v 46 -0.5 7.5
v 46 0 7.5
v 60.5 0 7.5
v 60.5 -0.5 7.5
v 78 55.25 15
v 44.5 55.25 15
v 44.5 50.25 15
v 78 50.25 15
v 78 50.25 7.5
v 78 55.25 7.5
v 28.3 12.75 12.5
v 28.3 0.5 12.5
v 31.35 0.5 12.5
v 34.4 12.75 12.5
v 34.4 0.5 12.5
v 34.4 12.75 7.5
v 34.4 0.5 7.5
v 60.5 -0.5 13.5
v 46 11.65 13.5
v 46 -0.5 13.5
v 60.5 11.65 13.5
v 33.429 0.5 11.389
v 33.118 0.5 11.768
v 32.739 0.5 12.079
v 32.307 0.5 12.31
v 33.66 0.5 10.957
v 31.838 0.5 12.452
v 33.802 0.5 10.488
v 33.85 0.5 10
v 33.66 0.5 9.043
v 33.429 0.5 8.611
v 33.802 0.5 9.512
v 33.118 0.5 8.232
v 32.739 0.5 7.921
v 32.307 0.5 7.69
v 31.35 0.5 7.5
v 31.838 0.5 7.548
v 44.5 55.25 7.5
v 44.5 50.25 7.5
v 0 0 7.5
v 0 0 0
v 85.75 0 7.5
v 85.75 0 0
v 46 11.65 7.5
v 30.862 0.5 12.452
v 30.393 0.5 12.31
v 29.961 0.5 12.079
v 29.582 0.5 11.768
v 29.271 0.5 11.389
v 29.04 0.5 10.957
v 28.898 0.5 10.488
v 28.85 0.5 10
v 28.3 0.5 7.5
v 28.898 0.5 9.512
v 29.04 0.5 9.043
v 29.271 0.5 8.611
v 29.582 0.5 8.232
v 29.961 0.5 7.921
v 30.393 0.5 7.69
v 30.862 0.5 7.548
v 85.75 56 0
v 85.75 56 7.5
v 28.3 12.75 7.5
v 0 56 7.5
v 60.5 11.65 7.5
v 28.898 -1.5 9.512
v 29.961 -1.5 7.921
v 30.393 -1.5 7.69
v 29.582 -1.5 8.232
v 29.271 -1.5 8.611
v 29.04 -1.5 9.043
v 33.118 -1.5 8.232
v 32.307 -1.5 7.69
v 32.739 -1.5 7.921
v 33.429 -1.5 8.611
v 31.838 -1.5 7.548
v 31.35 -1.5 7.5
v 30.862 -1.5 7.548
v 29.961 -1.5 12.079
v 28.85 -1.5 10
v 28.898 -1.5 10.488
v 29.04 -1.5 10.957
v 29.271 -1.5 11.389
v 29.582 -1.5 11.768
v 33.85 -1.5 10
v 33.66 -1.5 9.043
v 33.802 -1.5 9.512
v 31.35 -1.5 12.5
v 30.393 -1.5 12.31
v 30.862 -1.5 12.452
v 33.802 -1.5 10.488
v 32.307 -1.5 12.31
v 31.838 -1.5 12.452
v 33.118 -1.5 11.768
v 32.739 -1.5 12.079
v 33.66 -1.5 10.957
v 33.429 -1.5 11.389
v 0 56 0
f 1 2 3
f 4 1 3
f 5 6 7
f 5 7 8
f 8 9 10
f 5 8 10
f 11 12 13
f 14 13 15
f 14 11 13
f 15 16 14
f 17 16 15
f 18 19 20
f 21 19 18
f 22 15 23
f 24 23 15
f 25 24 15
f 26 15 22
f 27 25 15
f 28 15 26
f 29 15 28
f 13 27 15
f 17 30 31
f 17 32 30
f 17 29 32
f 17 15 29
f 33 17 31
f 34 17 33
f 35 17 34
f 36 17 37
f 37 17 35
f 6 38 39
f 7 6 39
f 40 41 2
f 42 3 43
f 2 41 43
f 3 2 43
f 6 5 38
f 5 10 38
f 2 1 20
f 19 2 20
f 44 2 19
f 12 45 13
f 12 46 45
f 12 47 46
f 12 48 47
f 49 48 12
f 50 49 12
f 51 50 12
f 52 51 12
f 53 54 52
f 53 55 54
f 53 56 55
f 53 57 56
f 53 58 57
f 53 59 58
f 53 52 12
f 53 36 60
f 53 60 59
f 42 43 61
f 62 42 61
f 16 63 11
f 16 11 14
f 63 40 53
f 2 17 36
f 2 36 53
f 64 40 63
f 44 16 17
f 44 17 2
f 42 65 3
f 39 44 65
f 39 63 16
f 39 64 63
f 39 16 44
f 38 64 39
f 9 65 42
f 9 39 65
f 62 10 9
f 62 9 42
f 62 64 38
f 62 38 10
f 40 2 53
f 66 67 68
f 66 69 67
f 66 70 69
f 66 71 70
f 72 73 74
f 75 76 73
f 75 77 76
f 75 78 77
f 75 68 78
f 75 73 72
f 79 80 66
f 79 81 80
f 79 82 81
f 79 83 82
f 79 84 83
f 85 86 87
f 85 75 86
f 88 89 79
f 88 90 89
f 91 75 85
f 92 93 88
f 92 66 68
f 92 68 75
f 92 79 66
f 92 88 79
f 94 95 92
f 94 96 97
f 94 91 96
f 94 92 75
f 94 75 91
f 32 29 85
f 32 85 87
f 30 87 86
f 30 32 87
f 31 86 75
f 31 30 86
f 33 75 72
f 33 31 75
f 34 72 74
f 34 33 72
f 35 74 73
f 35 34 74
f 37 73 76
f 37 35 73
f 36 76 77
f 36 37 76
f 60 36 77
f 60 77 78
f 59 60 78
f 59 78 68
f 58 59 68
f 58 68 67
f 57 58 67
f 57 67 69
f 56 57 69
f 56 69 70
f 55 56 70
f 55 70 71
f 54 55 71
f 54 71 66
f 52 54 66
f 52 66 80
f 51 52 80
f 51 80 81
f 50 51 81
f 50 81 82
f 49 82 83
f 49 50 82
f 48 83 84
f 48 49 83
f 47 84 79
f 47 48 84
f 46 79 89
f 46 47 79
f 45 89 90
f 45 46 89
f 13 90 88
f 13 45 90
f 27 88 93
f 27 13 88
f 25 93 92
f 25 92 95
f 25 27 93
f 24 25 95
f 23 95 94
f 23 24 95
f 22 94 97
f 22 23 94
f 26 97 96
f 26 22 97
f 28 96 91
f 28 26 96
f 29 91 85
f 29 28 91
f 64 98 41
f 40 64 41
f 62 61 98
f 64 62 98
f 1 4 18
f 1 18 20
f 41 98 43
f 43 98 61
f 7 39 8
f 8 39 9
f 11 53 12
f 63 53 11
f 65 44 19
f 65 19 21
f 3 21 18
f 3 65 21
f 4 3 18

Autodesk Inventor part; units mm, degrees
ref_plane "YZ Plane" through (0, 0, 0) normal (1, 0, 0) x (0, 1, 0)
ref_plane "XZ Plane" through (0, 0, 0) normal (0, 1, 0) x (-1, 0, 0)
ref_plane "XY Plane" through (0, 0, 0) normal (0, 0, 1) x (1, 0, 0)
sketch "Sketch1" plane through (0, 0, 0) normal (0, 0, 1) x (1, 0, 0)
  line L0 (0, 0) -> (85.75, 0)
  line L1 (85.75, 0) -> (85.75, 56)
  line L2 (85.75, 56) -> (0, 56)
  line L3 (0, 56) -> (0, 0)
  dimension "d0" = 85.75
  dimension "d1" = 56
extrude "Extrusion1" add sketch "Sketch1" along normal blind 7.5
sketch "Sketch3" plane through (0, 0, 7.5) normal (0, 0, 1) x (1, 0, 0)
  line L0 (78, 55.25) -> (44.5, 55.25)
  line L1 (44.5, 55.25) -> (44.5, 50.25)
  line L2 (44.5, 50.25) -> (78, 50.25)
  line L3 (78, 50.25) -> (78, 55.25)
  line L4 (85.75, 56) -> (0, 56) projected
  line L5 (85.75, 0) -> (85.75, 56) projected
  point P0 (0, 0)
  dimension "d19" = 33.5
  dimension "d20" = 5
  dimension "d21" = 0.75
  dimension "d22" = 7.75
extrude "Extrusion3" add sketch "Sketch3" along normal blind 7.5
sketch "Sketch4" plane through (0, 0, 7.5) normal (0, 0, 1) x (1, 0, 0)
  line L0 (46, 11.65) -> (60.5, 11.65)
  line L1 (60.5, 11.65) -> (60.5, -0.5)
  line L2 (60.5, -0.5) -> (46, -0.5)
  line L3 (46, -0.5) -> (46, 11.65)
  line L4 (0, 0) -> (85.75, 0) projected
  line L5 (85.75, 0) -> (85.75, 56) projected
  dimension "d25" = 14.5
  dimension "d26" = 12.15
  dimension "d28" = 0.5
  dimension "d29" = 25.25
extrude "Extrusion4" add sketch "Sketch4" along normal blind 6
sketch "Sketch5" plane through (0, 0, 7.5) normal (0, 0, 1) x (1, 0, 0)
  line L0 (28.3, 12.75) -> (34.4, 12.75)
  line L1 (34.4, 12.75) -> (34.4, 0.5)
  line L2 (34.4, 0.5) -> (28.3, 0.5)
  line L3 (28.3, 0.5) -> (28.3, 12.75)
  line L4 (0, 0) -> (46, 0) projected
  line L5 (0, 56) -> (0, 0) projected
  dimension "d32" = 12.25
  dimension "d33" = 6.1
  dimension "d35" = 28.3
  dimension "d36" = 0.5
extrude "Extrusion5" add sketch "Sketch5" along normal blind 5
sketch "Sketch6" plane through (28.3, 0.5, 7.5) normal (0, -1, 0) x (1, 0, 0)
  line L0 (6.1, 5) -> (0, 5) projected
  line L1 (3.05, 5) -> (3.05, 2.5)
  circle A0 centre (3.05, 2.5) radius 2.5
  point P0 (-28.3, -7.5)
  dimension "d39" = 2.5
  dimension "d40" = 5
extrude "Extrusion6" add sketch "Sketch6" along normal blind 2
properties part number "RaspberryPi3_Screen"
